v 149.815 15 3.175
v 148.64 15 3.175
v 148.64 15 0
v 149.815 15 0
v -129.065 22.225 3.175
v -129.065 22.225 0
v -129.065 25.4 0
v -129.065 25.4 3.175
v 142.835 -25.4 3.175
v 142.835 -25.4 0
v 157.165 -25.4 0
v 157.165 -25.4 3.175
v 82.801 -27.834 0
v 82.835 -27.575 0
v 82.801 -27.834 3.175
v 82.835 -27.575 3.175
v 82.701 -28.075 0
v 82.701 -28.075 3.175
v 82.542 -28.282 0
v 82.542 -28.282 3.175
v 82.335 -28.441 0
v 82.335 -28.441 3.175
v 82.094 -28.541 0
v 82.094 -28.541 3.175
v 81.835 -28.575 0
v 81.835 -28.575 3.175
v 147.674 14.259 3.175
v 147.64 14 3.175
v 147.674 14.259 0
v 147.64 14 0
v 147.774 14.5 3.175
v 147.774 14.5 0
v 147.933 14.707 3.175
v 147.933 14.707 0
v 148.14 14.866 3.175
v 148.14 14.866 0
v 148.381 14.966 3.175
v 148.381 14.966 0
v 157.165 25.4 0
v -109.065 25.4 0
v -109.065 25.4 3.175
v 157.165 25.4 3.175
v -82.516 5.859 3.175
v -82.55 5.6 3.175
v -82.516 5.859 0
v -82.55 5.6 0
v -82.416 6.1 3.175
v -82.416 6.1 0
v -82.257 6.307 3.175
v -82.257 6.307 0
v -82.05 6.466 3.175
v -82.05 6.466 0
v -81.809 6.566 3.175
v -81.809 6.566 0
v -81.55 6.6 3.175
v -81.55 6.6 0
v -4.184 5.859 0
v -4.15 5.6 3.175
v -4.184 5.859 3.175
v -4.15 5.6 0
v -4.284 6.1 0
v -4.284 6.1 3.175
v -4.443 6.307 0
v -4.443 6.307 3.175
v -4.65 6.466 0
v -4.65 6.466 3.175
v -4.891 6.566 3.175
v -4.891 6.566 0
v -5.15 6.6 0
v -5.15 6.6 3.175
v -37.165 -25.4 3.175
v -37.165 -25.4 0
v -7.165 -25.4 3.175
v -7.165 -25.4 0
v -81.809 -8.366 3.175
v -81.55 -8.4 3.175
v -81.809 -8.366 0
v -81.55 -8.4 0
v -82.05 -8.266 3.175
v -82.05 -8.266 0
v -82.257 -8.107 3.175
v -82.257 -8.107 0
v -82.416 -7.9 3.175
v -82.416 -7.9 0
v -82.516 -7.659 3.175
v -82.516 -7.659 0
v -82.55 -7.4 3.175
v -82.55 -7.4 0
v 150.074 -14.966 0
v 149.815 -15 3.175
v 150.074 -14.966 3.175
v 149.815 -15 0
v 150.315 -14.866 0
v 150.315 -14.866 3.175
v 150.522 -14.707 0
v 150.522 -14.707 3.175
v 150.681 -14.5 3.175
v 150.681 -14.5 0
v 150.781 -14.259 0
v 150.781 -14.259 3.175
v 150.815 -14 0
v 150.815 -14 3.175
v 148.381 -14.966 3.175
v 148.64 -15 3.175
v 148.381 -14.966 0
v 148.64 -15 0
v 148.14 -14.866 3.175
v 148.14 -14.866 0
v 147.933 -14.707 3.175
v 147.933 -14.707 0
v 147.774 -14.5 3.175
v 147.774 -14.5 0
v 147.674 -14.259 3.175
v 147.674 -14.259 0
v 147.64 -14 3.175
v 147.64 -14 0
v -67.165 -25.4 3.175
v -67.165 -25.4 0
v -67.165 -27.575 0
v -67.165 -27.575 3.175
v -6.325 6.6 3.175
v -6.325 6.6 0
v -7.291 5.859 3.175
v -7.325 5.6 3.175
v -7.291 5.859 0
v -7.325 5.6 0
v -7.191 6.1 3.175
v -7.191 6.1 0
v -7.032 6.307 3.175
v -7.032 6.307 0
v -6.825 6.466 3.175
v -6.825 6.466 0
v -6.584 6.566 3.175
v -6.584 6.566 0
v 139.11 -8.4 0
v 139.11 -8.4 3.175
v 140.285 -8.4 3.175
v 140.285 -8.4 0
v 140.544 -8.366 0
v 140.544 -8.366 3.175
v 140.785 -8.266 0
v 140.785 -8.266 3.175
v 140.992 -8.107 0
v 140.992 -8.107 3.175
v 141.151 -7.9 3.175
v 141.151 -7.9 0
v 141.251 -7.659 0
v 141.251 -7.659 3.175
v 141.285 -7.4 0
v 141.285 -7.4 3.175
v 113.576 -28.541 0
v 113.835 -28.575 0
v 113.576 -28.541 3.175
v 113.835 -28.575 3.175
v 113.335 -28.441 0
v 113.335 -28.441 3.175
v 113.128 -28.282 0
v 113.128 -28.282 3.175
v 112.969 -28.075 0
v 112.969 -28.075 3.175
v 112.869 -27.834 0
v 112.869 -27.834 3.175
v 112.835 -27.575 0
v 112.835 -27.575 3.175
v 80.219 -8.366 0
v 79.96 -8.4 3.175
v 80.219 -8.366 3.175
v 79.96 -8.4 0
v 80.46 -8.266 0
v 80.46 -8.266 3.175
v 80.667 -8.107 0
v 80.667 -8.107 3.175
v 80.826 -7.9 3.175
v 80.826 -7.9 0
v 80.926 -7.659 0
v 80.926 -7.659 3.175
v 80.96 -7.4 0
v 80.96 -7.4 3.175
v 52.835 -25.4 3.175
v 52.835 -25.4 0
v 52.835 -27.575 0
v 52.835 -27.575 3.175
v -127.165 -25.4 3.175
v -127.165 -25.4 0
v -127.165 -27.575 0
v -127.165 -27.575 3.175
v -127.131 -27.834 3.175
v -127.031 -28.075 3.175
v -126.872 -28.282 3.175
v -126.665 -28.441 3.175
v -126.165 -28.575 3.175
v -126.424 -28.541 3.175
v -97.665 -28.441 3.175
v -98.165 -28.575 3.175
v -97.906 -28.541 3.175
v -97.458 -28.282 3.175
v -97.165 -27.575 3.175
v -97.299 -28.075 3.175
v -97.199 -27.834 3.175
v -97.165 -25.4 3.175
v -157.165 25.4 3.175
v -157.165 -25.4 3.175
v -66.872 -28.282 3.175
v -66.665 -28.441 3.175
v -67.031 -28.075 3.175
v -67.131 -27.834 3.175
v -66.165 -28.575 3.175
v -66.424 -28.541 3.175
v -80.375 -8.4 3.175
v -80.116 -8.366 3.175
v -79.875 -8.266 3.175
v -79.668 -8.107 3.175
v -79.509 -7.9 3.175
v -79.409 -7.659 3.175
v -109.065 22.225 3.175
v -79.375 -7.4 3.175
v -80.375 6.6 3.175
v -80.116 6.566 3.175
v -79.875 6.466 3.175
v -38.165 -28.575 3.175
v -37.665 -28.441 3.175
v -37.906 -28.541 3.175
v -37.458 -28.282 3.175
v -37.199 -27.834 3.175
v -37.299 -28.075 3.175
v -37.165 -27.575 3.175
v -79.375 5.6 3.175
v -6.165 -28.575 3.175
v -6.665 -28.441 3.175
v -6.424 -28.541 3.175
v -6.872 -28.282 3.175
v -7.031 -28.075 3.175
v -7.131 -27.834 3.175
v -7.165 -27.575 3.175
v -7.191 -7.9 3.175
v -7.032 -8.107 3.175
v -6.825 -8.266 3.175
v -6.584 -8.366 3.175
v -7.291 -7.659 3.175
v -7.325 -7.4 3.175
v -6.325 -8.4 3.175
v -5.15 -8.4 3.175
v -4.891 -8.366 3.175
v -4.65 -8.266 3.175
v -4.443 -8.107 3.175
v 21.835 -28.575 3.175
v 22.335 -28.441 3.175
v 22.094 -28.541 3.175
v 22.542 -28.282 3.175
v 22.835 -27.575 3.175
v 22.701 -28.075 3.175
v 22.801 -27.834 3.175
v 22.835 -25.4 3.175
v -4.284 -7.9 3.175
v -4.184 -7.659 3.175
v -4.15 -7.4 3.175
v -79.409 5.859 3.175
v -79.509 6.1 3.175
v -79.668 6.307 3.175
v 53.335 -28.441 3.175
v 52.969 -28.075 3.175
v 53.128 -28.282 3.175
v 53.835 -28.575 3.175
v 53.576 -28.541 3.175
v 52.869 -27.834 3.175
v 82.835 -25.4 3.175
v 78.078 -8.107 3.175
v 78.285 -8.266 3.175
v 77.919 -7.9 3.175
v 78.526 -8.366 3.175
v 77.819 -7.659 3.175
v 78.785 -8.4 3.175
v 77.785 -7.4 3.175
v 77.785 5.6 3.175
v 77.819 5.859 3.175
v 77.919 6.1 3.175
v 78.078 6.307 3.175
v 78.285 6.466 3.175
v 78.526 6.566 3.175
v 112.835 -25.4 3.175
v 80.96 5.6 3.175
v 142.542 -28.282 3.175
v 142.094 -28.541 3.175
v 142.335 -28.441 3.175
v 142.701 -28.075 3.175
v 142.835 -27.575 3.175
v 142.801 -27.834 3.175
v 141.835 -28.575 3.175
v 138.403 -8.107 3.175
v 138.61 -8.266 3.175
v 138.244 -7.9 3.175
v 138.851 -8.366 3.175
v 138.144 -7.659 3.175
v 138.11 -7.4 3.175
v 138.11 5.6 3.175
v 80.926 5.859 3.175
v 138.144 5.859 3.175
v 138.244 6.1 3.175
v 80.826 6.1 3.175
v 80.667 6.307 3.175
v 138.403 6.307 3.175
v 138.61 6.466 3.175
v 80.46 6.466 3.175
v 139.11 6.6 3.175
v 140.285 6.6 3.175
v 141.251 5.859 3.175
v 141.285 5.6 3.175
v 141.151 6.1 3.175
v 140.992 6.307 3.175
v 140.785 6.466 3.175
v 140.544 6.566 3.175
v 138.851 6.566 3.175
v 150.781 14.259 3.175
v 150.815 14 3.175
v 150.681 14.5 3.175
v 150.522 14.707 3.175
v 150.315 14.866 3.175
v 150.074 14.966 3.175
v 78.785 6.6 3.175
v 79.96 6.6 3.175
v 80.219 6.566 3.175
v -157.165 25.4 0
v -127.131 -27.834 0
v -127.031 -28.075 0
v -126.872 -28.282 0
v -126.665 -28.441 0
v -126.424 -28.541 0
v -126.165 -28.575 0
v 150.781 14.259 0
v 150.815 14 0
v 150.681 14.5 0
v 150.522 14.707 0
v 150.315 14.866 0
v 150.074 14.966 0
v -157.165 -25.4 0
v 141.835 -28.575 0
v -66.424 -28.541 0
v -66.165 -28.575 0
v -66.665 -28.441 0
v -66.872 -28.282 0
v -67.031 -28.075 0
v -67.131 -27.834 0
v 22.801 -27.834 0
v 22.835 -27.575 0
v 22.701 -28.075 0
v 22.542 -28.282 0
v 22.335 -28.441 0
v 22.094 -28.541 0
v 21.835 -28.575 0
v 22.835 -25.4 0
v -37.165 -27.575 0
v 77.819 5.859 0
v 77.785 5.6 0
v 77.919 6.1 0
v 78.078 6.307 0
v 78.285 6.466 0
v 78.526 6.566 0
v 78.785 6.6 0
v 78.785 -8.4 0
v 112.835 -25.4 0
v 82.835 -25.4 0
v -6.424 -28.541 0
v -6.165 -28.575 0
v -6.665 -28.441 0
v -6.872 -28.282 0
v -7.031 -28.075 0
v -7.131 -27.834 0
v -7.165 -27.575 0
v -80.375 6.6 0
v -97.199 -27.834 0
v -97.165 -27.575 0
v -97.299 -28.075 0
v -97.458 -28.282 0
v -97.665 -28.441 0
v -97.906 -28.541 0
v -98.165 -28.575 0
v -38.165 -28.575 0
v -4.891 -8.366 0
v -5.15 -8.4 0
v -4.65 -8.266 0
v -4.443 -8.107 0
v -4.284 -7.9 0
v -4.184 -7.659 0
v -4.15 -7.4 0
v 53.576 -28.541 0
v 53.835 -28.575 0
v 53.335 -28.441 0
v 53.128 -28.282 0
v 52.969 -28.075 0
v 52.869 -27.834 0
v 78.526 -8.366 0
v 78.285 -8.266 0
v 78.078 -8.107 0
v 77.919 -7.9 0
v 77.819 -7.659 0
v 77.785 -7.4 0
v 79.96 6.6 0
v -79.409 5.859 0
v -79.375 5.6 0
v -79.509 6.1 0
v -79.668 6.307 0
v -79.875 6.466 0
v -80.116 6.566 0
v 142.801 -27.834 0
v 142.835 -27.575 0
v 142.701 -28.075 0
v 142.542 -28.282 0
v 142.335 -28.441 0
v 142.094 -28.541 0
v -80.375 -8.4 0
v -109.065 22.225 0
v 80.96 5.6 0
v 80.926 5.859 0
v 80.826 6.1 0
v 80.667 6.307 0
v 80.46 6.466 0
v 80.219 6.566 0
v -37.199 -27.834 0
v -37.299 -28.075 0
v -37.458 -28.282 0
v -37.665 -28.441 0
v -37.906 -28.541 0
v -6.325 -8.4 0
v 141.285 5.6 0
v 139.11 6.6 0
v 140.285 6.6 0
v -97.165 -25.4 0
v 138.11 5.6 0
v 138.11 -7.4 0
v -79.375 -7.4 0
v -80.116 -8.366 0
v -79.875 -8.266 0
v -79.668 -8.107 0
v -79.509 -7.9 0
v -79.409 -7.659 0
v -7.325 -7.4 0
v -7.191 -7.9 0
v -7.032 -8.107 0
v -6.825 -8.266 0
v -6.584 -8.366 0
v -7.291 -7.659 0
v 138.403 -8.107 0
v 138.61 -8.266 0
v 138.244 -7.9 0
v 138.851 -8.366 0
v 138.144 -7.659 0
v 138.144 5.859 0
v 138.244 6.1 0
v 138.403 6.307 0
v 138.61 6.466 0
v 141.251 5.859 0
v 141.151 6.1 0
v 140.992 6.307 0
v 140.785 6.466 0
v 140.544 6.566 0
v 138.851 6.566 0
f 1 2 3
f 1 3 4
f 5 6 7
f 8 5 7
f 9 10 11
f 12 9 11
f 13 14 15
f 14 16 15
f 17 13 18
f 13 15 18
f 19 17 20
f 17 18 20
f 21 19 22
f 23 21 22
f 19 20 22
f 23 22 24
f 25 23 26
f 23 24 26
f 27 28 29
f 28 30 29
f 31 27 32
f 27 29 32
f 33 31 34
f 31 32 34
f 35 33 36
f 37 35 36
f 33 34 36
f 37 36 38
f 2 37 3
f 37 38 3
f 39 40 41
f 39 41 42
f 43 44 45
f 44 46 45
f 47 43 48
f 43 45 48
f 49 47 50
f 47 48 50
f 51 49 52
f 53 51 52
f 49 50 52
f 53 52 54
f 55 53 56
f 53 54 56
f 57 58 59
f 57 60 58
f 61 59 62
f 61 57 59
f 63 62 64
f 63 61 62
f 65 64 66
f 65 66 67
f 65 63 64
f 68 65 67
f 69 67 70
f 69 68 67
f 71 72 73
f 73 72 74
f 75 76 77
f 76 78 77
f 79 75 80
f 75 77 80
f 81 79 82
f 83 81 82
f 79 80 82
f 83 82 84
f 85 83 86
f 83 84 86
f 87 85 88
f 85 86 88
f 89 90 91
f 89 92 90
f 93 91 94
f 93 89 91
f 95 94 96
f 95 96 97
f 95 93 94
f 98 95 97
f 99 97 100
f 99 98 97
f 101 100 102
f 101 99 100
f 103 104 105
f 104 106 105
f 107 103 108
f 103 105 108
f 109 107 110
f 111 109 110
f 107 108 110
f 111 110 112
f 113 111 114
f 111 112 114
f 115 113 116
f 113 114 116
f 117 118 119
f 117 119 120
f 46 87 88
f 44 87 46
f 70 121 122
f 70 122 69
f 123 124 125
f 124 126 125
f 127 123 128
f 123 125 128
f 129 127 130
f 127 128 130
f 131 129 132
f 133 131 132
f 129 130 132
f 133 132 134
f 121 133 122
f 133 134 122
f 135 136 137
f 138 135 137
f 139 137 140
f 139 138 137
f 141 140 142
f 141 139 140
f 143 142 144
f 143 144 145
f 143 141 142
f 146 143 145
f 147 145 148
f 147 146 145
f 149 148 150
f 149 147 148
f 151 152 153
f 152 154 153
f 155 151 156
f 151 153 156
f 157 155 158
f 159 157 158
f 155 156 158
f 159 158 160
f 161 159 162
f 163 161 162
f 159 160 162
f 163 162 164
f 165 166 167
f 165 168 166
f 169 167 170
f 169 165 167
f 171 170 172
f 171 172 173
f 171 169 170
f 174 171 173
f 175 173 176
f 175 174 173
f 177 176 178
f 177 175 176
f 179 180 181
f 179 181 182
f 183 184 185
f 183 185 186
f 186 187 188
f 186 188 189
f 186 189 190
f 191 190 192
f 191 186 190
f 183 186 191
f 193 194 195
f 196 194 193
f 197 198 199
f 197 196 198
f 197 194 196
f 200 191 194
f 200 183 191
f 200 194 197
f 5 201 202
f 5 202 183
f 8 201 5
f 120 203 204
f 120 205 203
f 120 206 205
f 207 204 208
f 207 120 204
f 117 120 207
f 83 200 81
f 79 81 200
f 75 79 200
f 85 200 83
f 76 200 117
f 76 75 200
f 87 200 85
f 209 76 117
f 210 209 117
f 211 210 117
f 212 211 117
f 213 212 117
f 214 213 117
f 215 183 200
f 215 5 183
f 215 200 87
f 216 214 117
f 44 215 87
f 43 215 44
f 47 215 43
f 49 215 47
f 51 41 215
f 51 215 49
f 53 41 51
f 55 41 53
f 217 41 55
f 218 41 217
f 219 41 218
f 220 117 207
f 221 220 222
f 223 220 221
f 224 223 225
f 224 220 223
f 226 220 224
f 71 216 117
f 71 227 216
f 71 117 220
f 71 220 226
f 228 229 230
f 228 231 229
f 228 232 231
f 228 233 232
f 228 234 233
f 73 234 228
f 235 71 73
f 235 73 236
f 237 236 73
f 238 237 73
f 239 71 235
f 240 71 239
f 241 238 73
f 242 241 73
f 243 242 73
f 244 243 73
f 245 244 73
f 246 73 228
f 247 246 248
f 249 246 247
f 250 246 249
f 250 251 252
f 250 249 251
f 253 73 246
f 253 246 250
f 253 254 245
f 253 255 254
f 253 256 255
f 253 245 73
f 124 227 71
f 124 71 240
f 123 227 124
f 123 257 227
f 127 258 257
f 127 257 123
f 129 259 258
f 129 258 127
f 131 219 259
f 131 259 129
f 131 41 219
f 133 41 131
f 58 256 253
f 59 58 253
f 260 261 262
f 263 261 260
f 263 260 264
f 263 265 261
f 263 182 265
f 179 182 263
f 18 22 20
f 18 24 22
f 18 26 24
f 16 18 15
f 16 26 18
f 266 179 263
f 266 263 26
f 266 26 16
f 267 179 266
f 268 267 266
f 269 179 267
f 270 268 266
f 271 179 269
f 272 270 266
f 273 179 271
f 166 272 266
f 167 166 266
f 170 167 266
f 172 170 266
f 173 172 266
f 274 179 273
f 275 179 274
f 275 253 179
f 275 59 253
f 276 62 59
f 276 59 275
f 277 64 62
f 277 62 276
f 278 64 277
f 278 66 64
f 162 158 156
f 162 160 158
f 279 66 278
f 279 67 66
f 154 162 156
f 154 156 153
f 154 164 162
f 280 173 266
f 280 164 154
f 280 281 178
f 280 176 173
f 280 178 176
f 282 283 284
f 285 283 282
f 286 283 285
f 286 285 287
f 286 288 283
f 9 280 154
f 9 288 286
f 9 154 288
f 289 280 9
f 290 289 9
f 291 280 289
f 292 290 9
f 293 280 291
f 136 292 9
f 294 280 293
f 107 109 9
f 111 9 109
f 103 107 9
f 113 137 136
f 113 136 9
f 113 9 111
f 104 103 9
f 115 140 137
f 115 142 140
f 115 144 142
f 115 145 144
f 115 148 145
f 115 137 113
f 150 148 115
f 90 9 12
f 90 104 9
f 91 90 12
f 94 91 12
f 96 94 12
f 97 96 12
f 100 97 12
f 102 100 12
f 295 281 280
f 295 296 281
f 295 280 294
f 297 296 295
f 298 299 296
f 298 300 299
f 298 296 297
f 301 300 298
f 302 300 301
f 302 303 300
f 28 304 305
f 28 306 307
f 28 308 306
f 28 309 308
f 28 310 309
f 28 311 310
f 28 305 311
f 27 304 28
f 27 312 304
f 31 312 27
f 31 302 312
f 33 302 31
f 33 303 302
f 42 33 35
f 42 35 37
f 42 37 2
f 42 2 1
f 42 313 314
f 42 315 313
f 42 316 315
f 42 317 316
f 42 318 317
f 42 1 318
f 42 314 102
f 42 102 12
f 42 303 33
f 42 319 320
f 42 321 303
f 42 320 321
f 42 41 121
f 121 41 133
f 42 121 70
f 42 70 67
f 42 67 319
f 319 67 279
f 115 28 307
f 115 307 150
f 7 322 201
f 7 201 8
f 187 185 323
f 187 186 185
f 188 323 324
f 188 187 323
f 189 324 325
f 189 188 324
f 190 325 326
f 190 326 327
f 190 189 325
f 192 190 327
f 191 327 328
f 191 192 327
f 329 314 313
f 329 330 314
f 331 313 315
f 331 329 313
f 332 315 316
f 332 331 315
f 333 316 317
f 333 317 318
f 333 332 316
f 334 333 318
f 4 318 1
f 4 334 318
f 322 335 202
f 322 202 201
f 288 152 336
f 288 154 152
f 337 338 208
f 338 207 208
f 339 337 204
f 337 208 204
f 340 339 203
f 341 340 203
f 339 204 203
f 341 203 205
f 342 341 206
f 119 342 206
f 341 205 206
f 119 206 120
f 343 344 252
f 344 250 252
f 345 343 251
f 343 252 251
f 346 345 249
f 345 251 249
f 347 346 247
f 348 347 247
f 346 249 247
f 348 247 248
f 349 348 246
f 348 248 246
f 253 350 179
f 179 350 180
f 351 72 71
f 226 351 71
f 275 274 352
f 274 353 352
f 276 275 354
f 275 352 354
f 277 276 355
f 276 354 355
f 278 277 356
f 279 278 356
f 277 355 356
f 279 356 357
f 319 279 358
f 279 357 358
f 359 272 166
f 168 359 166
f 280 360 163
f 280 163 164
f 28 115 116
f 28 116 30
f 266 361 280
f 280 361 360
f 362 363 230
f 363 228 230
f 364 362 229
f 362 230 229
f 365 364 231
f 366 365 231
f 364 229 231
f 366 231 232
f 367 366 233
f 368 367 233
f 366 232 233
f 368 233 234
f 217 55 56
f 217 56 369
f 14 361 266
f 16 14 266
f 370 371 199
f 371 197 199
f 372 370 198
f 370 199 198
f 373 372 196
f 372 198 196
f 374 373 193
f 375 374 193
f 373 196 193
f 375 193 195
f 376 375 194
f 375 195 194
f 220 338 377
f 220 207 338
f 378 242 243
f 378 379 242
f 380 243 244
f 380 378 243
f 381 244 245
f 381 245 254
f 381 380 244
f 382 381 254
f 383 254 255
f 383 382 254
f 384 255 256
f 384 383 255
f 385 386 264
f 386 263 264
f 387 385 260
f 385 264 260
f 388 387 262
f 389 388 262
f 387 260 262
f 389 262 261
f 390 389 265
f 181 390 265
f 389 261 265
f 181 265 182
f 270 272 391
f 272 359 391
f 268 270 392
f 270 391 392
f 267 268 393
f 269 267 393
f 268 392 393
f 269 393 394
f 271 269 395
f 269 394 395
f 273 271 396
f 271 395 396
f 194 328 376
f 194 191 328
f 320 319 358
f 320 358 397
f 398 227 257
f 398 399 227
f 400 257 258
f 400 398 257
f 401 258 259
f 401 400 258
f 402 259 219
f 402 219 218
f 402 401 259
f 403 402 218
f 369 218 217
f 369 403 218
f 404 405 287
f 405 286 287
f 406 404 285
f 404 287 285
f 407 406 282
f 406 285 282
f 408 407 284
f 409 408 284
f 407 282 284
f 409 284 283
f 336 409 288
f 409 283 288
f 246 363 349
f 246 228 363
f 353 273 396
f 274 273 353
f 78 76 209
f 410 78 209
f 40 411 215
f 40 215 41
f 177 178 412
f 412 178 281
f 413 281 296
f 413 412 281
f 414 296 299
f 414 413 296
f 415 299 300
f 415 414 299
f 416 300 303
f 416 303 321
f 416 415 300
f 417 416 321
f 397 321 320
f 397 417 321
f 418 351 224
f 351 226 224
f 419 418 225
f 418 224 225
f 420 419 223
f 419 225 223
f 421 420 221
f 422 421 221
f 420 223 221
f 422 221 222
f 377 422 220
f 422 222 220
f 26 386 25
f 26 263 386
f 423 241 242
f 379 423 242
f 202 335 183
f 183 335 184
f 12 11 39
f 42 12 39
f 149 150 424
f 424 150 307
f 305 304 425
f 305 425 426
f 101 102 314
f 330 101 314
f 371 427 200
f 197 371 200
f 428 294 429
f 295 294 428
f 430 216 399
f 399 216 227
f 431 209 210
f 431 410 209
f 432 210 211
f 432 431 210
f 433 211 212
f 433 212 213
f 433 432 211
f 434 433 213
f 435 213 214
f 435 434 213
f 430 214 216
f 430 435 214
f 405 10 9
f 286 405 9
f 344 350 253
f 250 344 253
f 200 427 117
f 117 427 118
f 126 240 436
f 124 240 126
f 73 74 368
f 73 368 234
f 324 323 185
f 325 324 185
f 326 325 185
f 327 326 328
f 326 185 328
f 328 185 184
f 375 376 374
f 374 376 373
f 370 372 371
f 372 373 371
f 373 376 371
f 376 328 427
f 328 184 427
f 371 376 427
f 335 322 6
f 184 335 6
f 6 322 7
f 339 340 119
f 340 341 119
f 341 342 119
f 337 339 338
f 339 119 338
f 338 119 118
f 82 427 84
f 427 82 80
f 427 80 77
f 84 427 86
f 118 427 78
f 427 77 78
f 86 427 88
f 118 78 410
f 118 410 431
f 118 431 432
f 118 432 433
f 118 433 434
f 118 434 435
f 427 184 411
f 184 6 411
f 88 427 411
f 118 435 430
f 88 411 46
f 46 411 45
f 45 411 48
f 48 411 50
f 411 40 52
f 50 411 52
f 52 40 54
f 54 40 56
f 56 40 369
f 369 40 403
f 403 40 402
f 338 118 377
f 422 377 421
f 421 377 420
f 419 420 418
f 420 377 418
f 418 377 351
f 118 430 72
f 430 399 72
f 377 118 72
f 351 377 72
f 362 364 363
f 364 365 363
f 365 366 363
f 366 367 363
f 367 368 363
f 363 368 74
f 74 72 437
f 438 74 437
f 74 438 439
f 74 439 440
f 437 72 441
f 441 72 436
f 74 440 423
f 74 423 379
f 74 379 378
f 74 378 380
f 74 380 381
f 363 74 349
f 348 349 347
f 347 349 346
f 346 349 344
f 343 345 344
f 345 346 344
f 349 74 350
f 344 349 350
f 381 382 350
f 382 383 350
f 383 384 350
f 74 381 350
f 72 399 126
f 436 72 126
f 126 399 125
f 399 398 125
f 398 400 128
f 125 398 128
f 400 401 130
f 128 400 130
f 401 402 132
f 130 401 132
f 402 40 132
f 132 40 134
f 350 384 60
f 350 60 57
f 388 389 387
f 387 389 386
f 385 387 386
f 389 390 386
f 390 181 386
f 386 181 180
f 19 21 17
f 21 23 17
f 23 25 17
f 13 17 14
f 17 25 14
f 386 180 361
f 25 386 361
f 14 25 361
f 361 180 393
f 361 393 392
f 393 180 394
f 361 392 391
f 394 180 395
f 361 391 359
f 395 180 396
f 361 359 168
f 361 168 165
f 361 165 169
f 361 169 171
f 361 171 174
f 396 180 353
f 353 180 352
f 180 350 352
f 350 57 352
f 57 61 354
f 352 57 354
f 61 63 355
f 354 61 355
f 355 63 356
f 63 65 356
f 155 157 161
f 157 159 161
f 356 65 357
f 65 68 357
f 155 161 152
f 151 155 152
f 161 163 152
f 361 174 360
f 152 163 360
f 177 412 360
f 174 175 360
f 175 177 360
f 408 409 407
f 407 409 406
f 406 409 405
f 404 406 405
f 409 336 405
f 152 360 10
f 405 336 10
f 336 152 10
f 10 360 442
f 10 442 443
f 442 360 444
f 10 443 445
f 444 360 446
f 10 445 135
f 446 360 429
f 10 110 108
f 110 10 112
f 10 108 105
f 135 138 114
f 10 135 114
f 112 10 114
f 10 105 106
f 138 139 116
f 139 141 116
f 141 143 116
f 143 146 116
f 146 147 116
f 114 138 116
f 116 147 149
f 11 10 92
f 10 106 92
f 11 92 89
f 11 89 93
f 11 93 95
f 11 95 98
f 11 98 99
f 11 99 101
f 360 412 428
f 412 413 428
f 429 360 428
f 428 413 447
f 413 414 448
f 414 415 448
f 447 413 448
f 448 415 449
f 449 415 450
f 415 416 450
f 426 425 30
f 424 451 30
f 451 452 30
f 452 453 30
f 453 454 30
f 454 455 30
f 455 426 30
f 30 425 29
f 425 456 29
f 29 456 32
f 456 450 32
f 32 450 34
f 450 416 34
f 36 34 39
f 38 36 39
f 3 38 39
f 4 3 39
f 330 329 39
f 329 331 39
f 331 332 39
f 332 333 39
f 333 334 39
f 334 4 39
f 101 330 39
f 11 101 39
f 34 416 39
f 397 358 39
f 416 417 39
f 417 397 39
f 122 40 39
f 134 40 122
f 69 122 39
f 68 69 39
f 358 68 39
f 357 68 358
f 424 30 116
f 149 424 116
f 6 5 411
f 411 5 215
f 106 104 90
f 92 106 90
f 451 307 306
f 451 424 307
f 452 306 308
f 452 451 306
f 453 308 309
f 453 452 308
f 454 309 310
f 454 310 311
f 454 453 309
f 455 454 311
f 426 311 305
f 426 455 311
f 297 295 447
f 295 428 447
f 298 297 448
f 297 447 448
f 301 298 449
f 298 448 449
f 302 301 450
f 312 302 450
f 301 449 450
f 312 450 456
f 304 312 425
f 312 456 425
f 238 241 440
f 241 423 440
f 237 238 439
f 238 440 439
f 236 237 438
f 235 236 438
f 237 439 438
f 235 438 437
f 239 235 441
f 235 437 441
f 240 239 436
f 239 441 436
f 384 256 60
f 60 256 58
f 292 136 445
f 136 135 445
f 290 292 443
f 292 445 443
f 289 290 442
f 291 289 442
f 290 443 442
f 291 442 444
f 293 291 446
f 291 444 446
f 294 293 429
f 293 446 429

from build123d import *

# Parameters (mm, degrees)
SKETCH1_W           = 314.33
SKETCH1_H           = 50.8
BOSS_EXTRUDE1_DEPTH = 3.175
SKETCH2_W           = 3.175
SKETCH2_H           = 15
CUT_EXTRUDE1_DEPTH  = 4.175
SKETCH3_W           = 30
SKETCH3_H           = 3.175
BOSS_EXTRUDE2_DEPTH = 3.175
SKETCH4_W           = 3.175
SKETCH4_H           = 30
SKETCH4_H_2         = 15
CUT_EXTRUDE2_DEPTH  = 4.175
SKETCH5_W           = 20
SKETCH5_H           = 3.175
CUT_EXTRUDE3_DEPTH  = 4.175
FILLET1_R           = 1


with BuildPart() as part:
    # Sketch1 → Boss-Extrude1 (new body)
    with BuildSketch(Plane.XY):
        Rectangle(SKETCH1_W, SKETCH1_H)
    extrude(amount=BOSS_EXTRUDE1_DEPTH)

    # Sketch2 → Cut-Extrude1 (cut, through all)
    with BuildSketch(Plane.XY.offset(3.175)):
        with Locations((-80.9625, -0.9)):
            Rectangle(SKETCH2_W, SKETCH2_H)
        with Locations((-5.7375, -0.9)):
            Rectangle(SKETCH2_W, SKETCH2_H)
    extrude(amount=-CUT_EXTRUDE1_DEPTH, mode=Mode.SUBTRACT)

    # Sketch3 → Boss-Extrude2 (add)
    with BuildSketch(Plane.XZ.offset(25.4)):
        with Locations((-112.165, 1.5875)):
            Rectangle(SKETCH3_W, SKETCH3_H)
        with Locations((-52.165, 1.5875)):
            Rectangle(SKETCH3_W, SKETCH3_H)
        with Locations((127.835, 1.5875)):
            Rectangle(SKETCH3_W, SKETCH3_H)
        with Locations((67.835, 1.5875)):
            Rectangle(SKETCH3_W, SKETCH3_H)
        with Locations((7.835, 1.5875)):
            Rectangle(SKETCH3_W, SKETCH3_H)
    extrude(amount=BOSS_EXTRUDE2_DEPTH)

    # Sketch4 → Cut-Extrude2 (cut, through all)
    with BuildSketch(Plane.XY.offset(3.175)):
        with Locations((149.2275, 0)):
            Rectangle(SKETCH4_W, SKETCH4_H)
        with Locations((139.6975, -0.9)):
            Rectangle(SKETCH4_W, SKETCH4_H_2)
        with Locations((79.3725, -0.9)):
            Rectangle(SKETCH4_W, SKETCH4_H_2)
    extrude(amount=-CUT_EXTRUDE2_DEPTH, mode=Mode.SUBTRACT)

    # Sketch5 → Cut-Extrude3 (cut, through all)
    with BuildSketch(Plane.XY.offset(3.175)):
        with Locations((-119.065, 23.8125)):
            Rectangle(SKETCH5_W, SKETCH5_H)
    extrude(amount=-CUT_EXTRUDE3_DEPTH, mode=Mode.SUBTRACT)

    # Fillet1
    fillet1_edges = [part.edges().sort_by_distance(p)[0] for p in [
        (22.835, -28.575, 1.5875),
        (-7.165, -28.575, 1.5875),
        (147.64, -15, 1.5875),
        (147.64, 15, 1.5875),
        (150.815, 15, 1.5875),
        (150.815, -15, 1.5875),
        (141.285, 6.6, 1.5875),
        (141.285, -8.4, 1.5875),
        (138.11, -8.4, 1.5875),
        (138.11, 6.6, 1.5875),
        (80.96, 6.6, 1.5875),
        (80.96, -8.4, 1.5875),
        (77.785, -8.4, 1.5875),
        (77.785, 6.6, 1.5875),
        (-82.55, -8.4, 1.5875),
        (-82.55, 6.6, 1.5875),
        (-79.375, 6.6, 1.5875),
        (-79.375, -8.4, 1.5875),
        (-4.15, 6.6, 1.5875),
        (-4.15, -8.4, 1.5875),
        (-7.325, -8.4, 1.5875),
        (-7.325, 6.6, 1.5875),
        (-97.165, -28.575, 1.5875),
        (-127.165, -28.575, 1.5875),
        (-37.165, -28.575, 1.5875),
        (-67.165, -28.575, 1.5875),
        (142.835, -28.575, 1.5875),
        (112.835, -28.575, 1.5875),
        (82.835, -28.575, 1.5875),
        (52.835, -28.575, 1.5875),
    ]]
    fillet(fillet1_edges, radius=FILLET1_R)


solid = part.part
